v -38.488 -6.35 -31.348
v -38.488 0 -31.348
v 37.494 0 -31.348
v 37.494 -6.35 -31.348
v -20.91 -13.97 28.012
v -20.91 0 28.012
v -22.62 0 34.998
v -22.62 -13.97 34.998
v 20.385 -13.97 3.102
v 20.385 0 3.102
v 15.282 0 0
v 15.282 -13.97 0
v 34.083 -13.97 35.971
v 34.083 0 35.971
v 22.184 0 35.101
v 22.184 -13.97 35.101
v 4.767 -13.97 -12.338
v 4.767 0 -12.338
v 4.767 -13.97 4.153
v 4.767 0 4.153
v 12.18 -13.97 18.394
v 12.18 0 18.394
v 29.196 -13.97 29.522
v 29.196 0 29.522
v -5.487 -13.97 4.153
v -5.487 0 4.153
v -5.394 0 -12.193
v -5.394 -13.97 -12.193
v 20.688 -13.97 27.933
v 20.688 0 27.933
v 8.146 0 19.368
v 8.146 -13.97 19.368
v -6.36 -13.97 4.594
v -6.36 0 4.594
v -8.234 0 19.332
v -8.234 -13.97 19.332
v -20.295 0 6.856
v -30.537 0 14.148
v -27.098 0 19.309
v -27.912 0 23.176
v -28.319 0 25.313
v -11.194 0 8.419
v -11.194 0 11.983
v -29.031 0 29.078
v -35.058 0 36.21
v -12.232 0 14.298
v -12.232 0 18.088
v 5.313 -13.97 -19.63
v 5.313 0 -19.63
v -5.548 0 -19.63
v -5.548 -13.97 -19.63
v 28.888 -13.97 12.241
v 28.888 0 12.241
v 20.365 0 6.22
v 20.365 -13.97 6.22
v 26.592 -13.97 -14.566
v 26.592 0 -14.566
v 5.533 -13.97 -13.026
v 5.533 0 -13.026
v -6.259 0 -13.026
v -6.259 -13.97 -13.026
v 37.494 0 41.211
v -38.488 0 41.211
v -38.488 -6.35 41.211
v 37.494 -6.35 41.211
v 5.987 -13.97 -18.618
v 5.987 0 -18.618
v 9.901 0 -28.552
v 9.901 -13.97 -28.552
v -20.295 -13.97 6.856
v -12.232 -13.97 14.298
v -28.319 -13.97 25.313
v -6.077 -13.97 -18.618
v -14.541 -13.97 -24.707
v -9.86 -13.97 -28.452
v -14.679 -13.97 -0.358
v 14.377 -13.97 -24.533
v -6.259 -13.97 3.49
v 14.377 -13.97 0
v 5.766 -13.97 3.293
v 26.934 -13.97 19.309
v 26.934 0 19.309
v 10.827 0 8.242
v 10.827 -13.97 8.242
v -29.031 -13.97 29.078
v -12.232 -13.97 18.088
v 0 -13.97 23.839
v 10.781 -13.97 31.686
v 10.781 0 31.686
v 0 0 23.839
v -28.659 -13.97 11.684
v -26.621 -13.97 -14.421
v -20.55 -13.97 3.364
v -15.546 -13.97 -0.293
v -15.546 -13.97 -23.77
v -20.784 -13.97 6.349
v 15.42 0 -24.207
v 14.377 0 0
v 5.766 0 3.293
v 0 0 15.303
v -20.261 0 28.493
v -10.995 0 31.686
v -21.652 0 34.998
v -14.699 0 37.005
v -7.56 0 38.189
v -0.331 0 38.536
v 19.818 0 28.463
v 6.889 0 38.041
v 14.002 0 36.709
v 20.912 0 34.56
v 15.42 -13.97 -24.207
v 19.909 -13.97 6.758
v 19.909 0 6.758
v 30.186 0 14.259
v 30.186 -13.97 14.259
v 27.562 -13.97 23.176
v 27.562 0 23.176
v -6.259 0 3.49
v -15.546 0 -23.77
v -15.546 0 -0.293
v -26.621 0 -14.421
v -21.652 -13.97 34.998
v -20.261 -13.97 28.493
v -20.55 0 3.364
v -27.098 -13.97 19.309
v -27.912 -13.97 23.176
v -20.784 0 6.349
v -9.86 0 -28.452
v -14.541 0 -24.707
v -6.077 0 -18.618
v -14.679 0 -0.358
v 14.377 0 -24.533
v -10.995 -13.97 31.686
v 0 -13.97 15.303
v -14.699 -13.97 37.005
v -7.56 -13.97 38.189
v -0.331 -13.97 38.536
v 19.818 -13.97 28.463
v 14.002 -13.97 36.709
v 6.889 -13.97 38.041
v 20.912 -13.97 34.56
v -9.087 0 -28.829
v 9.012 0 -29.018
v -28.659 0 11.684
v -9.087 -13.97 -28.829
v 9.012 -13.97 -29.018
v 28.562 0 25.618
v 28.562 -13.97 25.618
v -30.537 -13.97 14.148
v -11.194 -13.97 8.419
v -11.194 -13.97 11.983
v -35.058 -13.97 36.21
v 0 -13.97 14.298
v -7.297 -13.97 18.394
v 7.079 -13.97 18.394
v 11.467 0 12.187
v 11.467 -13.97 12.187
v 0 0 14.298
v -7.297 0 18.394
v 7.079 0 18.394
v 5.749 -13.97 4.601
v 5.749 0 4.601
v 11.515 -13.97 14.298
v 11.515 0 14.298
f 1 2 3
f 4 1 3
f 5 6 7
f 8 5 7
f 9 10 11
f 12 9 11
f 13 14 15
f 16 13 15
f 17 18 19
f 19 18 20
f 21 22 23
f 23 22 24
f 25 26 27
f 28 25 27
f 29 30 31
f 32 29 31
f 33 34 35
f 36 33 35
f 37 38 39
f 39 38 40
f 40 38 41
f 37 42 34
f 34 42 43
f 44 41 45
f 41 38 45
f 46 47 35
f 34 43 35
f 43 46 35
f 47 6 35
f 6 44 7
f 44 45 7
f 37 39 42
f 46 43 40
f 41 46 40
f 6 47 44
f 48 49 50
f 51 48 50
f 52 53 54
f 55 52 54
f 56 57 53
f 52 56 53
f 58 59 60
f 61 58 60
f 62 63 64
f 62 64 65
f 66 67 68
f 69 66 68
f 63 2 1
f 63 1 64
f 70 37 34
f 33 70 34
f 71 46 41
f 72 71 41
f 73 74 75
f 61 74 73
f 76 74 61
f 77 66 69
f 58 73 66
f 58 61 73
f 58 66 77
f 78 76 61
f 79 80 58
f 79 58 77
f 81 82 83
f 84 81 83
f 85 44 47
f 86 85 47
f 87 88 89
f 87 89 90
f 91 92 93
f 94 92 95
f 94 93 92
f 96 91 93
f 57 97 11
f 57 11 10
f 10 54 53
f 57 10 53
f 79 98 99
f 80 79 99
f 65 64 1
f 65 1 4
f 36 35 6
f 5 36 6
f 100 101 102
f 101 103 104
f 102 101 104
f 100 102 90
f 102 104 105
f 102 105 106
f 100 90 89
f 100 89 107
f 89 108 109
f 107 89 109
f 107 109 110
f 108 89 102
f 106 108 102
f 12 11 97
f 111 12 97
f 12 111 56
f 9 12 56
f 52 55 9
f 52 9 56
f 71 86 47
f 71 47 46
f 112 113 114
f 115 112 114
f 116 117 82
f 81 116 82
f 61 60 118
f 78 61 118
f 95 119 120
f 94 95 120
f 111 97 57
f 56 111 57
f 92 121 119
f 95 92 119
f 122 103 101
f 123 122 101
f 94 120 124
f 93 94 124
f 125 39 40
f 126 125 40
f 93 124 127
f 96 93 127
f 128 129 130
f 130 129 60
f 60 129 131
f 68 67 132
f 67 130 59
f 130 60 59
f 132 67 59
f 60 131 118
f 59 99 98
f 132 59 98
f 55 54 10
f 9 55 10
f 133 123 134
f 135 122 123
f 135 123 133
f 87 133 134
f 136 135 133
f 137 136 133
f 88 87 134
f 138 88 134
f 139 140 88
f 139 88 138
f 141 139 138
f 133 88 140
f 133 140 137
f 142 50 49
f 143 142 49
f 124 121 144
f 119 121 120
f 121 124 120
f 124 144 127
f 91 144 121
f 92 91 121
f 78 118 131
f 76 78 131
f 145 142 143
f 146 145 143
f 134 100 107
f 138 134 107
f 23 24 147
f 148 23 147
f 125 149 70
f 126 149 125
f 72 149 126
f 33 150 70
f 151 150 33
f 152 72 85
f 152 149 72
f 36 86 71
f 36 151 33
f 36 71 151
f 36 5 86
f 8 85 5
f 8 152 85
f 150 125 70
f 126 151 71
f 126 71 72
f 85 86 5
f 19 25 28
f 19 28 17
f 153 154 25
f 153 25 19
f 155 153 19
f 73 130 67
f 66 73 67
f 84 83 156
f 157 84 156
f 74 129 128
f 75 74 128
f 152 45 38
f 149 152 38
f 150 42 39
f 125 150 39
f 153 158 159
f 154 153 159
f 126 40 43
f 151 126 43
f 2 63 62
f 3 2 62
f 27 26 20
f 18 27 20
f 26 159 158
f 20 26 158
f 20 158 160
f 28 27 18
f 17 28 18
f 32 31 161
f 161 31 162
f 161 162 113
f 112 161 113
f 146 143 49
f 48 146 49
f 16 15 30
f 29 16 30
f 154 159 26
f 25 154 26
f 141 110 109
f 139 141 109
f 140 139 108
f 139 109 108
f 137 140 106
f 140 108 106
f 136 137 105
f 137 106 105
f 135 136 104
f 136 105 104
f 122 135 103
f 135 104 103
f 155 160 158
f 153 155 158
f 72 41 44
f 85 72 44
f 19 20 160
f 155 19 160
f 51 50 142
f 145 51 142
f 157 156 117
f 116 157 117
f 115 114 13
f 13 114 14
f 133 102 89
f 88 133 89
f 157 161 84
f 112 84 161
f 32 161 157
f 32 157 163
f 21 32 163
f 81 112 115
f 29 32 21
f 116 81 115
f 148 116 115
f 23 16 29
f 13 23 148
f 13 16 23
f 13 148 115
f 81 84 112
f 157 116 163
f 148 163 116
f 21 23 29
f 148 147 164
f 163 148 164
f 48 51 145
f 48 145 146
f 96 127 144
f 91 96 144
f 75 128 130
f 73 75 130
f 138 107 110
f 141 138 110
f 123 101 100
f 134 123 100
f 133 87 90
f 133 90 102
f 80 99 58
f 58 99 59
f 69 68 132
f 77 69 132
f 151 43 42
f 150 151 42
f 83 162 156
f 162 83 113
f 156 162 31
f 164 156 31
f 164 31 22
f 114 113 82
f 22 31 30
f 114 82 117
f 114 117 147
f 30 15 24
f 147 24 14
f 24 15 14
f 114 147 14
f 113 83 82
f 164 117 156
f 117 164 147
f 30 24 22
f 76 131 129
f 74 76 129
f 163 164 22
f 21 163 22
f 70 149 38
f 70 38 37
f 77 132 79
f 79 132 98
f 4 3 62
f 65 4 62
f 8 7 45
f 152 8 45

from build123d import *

# Parameters (mm, degrees)
F1_DEPTH = 13.97
F2_W     = 75.981866
F2_H     = 72.55926
F3_DEPTH = 6.35


with BuildPart() as f1:
    # F0 (on Front) → F1 (new body)
    with BuildSketch(Plane.XZ):
        Polygon((-20.910123, 28.011868), (-22.620002, 34.998063), (-35.057768, 36.210492), (-30.537196, 14.147671), (-20.295395, 6.855702), (-6.360257, 4.594069), (-8.23403, 19.331923), align=None)
        Polygon((-27.097644, 19.309429), (-27.911682, 23.176109), (-11.193576, 11.983092), (-11.193576, 8.419131), align=None, mode=Mode.SUBTRACT)
        Polygon((-28.318701, 25.312956), (-29.030984, 29.077882), (-12.232408, 18.088374), (-12.232408, 14.29788), align=None, mode=Mode.SUBTRACT)
        Polygon((-20.783758, 6.348564), (-28.658887, 11.68425), (-26.620794, -14.420622), (-15.546496, -23.769883), (-15.546496, -0.293103), (-20.54969, 3.364203), align=None)
        Polygon((-6.259062, 3.4897), (-14.679422, -0.358425), (-14.541315, -24.707351), (-9.859964, -28.452432), (-6.077021, -18.618327), (5.986684, -18.618327), (9.901049, -28.552113), (14.377185, -24.533365), (14.377185, 0), (5.766023, 3.293024), (5.532654, -13.025526), (-6.259062, -13.025526), align=None)
        Polygon((8.145996, 19.367998), (5.74935, 4.600975), (19.909376, 6.758386), (30.186456, 14.258976), (34.083426, 35.970651), (22.183755, 35.100792), (20.687599, 27.933156), align=None)
        Polygon((10.827216, 8.242161), (11.467388, 12.186602), (27.561653, 23.176109), (26.934102, 19.309429), align=None, mode=Mode.SUBTRACT)
        Polygon((11.514941, 14.29788), (12.179671, 18.393638), (29.195807, 29.522355), (28.562177, 25.618222), align=None, mode=Mode.SUBTRACT)
        Polygon((28.888335, 12.24093), (20.364532, 6.220476), (20.385059, 3.102237), (15.282434, 0), (15.419736, -24.207037), (26.591713, -14.566036), align=None)
        Polygon((-5.548328, -19.630127), (-9.087029, -28.829303), (9.012265, -29.018412), (5.312853, -19.630127), align=None)
        Polygon((0, 14.29788), (-7.297143, 18.393638), (-5.486633, 4.153366), (-5.393916, -12.193046), (4.767399, -12.338362), (4.767399, 4.153366), (7.078555, 18.393638), align=None)
        with BuildLine():
            ThreePointArc((20.912376, 34.560182), (-0.331395, 38.536173), (-21.652466, 34.998063))
            Line((-21.652466, 34.998063), (-20.26088, 28.492849))
            Line((-20.26088, 28.492849), (0, 15.303041))
            Line((0, 15.303041), (19.818077, 28.46338))
            Line((19.818077, 28.46338), (20.912376, 34.560182))
        make_face()
        Polygon((0, 23.838738), (-10.995117, 31.68603), (10.781131, 31.68603), align=None, mode=Mode.SUBTRACT)
    extrude(amount=F1_DEPTH)


with BuildPart() as f3:
    # F2 (on Front) → F3 (new body)
    with BuildSketch(Plane.XZ):
        with Locations((-0.497287, 4.931718)):
            Rectangle(F2_W, F2_H)
    extrude(amount=F3_DEPTH)


solid = Compound([f1.part, f3.part])
